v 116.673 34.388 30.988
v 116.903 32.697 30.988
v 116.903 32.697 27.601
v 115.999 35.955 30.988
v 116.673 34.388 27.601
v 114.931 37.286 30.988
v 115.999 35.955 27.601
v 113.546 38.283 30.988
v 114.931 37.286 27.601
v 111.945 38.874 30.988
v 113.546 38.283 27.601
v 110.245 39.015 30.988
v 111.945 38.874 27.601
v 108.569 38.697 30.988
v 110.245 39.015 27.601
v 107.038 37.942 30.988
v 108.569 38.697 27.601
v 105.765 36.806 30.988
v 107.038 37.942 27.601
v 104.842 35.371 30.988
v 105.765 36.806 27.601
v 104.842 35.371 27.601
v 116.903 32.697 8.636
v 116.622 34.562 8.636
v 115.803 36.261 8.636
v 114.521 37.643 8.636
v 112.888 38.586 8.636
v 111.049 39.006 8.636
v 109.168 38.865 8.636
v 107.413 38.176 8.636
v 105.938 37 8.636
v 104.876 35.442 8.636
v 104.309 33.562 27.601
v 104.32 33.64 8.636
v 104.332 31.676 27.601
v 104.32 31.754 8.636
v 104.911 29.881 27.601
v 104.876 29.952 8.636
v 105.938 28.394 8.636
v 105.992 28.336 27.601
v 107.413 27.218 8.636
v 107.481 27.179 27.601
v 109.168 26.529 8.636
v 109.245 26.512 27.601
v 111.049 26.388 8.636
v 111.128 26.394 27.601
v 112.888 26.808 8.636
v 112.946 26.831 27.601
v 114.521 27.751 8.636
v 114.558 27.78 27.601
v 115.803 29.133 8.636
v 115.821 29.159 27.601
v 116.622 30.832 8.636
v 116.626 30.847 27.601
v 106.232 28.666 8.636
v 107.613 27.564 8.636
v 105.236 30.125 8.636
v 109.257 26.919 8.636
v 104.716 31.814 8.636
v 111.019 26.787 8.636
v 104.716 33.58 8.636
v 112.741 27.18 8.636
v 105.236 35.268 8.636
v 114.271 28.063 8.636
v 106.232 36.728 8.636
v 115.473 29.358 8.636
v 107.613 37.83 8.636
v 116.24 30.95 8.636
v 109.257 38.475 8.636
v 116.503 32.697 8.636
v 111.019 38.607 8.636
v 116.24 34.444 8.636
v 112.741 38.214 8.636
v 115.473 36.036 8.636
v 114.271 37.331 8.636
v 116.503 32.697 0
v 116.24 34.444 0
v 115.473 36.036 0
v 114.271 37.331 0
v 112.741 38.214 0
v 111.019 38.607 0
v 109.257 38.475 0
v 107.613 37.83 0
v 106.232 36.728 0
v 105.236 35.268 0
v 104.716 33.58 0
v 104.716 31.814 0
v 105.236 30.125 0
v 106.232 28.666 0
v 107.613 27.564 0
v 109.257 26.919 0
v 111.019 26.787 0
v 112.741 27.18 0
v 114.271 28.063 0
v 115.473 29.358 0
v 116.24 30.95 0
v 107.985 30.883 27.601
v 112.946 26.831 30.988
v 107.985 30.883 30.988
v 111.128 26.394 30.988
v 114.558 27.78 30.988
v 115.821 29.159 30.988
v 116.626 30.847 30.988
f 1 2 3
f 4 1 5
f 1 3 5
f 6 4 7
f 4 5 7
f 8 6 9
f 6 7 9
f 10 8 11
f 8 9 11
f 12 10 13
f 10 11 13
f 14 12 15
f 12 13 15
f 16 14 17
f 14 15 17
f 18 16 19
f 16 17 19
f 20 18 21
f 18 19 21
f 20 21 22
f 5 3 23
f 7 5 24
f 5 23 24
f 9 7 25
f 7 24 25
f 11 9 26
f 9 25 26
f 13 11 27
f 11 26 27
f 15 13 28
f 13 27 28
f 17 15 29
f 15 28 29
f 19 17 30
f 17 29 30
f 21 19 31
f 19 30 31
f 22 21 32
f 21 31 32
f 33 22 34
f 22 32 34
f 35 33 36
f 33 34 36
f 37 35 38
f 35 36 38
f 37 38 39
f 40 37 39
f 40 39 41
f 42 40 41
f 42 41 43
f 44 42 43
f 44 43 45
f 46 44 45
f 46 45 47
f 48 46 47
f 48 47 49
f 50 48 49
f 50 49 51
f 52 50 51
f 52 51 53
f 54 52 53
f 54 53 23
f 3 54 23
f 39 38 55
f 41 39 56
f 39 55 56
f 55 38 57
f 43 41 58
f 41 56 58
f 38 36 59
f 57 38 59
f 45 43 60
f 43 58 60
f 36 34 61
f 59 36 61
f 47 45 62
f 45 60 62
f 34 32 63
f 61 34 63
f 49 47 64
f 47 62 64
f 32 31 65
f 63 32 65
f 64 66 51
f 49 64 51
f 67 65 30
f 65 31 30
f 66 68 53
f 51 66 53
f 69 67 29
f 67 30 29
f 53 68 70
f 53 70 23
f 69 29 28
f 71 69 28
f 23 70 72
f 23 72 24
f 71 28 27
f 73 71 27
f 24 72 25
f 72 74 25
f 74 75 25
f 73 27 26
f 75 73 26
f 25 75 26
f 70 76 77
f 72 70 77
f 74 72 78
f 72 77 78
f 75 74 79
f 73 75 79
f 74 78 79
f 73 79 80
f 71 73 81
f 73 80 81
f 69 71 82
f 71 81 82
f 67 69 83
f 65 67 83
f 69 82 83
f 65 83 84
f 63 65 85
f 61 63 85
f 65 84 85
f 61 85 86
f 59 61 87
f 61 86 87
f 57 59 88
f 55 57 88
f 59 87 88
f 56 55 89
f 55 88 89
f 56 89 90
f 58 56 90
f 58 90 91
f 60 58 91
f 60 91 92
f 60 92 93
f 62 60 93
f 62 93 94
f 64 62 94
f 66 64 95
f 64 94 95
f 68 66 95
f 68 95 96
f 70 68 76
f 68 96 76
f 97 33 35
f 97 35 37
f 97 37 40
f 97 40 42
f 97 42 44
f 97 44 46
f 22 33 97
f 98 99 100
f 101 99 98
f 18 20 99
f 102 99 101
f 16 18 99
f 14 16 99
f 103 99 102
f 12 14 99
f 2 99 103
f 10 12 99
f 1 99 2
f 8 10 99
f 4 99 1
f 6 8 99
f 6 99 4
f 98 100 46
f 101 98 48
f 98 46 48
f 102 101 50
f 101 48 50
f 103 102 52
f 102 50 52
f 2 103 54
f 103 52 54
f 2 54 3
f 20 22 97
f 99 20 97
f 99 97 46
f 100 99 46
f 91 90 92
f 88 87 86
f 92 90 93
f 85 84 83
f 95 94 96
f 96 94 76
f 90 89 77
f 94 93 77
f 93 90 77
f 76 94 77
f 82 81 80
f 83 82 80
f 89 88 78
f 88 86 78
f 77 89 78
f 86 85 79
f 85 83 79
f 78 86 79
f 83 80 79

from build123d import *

# Parameters (mm, degrees)
SKETCH1_R           = 5.926666667
BOSS_EXTRUDE1_DEPTH = 8.636
SKETCH2_R           = 6.326666667
BOSS_EXTRUDE2_DEPTH = 18.965333333
BOSS_EXTRUDE3_DEPTH = 3.386666667


with BuildPart() as part:
    # Sketch1 → Boss-Extrude1 (new body)
    with BuildSketch(Plane.XY):
        with Locations((110.576144023, 32.69693519)):
            Circle(SKETCH1_R)
    extrude(amount=BOSS_EXTRUDE1_DEPTH)

    # Sketch2 → Boss-Extrude2 (add)
    with BuildSketch(Plane.XY.offset(8.636)):
        with Locations((110.576144023, 32.69693519)):
            Circle(SKETCH2_R)
    extrude(amount=BOSS_EXTRUDE2_DEPTH)

    # Sketch3 → Boss-Extrude3 (add)
    with BuildSketch(Plane.XY.offset(27.601333333)):
        with BuildLine():
            Line((104.842236757, 35.37070006), (107.984893057, 30.88252173))
            Line((107.984893057, 30.88252173), (111.127549356, 26.3943434))
            ThreePointArc((111.127549356, 26.3943434), (115.240651974, 28.422701143), (116.90281069, 32.69693519))
            ThreePointArc((116.90281069, 32.69693519), (111.945485314, 38.873634595), (104.842236757, 35.37070006))
        make_face()
    extrude(amount=BOSS_EXTRUDE3_DEPTH)


solid = part.part
